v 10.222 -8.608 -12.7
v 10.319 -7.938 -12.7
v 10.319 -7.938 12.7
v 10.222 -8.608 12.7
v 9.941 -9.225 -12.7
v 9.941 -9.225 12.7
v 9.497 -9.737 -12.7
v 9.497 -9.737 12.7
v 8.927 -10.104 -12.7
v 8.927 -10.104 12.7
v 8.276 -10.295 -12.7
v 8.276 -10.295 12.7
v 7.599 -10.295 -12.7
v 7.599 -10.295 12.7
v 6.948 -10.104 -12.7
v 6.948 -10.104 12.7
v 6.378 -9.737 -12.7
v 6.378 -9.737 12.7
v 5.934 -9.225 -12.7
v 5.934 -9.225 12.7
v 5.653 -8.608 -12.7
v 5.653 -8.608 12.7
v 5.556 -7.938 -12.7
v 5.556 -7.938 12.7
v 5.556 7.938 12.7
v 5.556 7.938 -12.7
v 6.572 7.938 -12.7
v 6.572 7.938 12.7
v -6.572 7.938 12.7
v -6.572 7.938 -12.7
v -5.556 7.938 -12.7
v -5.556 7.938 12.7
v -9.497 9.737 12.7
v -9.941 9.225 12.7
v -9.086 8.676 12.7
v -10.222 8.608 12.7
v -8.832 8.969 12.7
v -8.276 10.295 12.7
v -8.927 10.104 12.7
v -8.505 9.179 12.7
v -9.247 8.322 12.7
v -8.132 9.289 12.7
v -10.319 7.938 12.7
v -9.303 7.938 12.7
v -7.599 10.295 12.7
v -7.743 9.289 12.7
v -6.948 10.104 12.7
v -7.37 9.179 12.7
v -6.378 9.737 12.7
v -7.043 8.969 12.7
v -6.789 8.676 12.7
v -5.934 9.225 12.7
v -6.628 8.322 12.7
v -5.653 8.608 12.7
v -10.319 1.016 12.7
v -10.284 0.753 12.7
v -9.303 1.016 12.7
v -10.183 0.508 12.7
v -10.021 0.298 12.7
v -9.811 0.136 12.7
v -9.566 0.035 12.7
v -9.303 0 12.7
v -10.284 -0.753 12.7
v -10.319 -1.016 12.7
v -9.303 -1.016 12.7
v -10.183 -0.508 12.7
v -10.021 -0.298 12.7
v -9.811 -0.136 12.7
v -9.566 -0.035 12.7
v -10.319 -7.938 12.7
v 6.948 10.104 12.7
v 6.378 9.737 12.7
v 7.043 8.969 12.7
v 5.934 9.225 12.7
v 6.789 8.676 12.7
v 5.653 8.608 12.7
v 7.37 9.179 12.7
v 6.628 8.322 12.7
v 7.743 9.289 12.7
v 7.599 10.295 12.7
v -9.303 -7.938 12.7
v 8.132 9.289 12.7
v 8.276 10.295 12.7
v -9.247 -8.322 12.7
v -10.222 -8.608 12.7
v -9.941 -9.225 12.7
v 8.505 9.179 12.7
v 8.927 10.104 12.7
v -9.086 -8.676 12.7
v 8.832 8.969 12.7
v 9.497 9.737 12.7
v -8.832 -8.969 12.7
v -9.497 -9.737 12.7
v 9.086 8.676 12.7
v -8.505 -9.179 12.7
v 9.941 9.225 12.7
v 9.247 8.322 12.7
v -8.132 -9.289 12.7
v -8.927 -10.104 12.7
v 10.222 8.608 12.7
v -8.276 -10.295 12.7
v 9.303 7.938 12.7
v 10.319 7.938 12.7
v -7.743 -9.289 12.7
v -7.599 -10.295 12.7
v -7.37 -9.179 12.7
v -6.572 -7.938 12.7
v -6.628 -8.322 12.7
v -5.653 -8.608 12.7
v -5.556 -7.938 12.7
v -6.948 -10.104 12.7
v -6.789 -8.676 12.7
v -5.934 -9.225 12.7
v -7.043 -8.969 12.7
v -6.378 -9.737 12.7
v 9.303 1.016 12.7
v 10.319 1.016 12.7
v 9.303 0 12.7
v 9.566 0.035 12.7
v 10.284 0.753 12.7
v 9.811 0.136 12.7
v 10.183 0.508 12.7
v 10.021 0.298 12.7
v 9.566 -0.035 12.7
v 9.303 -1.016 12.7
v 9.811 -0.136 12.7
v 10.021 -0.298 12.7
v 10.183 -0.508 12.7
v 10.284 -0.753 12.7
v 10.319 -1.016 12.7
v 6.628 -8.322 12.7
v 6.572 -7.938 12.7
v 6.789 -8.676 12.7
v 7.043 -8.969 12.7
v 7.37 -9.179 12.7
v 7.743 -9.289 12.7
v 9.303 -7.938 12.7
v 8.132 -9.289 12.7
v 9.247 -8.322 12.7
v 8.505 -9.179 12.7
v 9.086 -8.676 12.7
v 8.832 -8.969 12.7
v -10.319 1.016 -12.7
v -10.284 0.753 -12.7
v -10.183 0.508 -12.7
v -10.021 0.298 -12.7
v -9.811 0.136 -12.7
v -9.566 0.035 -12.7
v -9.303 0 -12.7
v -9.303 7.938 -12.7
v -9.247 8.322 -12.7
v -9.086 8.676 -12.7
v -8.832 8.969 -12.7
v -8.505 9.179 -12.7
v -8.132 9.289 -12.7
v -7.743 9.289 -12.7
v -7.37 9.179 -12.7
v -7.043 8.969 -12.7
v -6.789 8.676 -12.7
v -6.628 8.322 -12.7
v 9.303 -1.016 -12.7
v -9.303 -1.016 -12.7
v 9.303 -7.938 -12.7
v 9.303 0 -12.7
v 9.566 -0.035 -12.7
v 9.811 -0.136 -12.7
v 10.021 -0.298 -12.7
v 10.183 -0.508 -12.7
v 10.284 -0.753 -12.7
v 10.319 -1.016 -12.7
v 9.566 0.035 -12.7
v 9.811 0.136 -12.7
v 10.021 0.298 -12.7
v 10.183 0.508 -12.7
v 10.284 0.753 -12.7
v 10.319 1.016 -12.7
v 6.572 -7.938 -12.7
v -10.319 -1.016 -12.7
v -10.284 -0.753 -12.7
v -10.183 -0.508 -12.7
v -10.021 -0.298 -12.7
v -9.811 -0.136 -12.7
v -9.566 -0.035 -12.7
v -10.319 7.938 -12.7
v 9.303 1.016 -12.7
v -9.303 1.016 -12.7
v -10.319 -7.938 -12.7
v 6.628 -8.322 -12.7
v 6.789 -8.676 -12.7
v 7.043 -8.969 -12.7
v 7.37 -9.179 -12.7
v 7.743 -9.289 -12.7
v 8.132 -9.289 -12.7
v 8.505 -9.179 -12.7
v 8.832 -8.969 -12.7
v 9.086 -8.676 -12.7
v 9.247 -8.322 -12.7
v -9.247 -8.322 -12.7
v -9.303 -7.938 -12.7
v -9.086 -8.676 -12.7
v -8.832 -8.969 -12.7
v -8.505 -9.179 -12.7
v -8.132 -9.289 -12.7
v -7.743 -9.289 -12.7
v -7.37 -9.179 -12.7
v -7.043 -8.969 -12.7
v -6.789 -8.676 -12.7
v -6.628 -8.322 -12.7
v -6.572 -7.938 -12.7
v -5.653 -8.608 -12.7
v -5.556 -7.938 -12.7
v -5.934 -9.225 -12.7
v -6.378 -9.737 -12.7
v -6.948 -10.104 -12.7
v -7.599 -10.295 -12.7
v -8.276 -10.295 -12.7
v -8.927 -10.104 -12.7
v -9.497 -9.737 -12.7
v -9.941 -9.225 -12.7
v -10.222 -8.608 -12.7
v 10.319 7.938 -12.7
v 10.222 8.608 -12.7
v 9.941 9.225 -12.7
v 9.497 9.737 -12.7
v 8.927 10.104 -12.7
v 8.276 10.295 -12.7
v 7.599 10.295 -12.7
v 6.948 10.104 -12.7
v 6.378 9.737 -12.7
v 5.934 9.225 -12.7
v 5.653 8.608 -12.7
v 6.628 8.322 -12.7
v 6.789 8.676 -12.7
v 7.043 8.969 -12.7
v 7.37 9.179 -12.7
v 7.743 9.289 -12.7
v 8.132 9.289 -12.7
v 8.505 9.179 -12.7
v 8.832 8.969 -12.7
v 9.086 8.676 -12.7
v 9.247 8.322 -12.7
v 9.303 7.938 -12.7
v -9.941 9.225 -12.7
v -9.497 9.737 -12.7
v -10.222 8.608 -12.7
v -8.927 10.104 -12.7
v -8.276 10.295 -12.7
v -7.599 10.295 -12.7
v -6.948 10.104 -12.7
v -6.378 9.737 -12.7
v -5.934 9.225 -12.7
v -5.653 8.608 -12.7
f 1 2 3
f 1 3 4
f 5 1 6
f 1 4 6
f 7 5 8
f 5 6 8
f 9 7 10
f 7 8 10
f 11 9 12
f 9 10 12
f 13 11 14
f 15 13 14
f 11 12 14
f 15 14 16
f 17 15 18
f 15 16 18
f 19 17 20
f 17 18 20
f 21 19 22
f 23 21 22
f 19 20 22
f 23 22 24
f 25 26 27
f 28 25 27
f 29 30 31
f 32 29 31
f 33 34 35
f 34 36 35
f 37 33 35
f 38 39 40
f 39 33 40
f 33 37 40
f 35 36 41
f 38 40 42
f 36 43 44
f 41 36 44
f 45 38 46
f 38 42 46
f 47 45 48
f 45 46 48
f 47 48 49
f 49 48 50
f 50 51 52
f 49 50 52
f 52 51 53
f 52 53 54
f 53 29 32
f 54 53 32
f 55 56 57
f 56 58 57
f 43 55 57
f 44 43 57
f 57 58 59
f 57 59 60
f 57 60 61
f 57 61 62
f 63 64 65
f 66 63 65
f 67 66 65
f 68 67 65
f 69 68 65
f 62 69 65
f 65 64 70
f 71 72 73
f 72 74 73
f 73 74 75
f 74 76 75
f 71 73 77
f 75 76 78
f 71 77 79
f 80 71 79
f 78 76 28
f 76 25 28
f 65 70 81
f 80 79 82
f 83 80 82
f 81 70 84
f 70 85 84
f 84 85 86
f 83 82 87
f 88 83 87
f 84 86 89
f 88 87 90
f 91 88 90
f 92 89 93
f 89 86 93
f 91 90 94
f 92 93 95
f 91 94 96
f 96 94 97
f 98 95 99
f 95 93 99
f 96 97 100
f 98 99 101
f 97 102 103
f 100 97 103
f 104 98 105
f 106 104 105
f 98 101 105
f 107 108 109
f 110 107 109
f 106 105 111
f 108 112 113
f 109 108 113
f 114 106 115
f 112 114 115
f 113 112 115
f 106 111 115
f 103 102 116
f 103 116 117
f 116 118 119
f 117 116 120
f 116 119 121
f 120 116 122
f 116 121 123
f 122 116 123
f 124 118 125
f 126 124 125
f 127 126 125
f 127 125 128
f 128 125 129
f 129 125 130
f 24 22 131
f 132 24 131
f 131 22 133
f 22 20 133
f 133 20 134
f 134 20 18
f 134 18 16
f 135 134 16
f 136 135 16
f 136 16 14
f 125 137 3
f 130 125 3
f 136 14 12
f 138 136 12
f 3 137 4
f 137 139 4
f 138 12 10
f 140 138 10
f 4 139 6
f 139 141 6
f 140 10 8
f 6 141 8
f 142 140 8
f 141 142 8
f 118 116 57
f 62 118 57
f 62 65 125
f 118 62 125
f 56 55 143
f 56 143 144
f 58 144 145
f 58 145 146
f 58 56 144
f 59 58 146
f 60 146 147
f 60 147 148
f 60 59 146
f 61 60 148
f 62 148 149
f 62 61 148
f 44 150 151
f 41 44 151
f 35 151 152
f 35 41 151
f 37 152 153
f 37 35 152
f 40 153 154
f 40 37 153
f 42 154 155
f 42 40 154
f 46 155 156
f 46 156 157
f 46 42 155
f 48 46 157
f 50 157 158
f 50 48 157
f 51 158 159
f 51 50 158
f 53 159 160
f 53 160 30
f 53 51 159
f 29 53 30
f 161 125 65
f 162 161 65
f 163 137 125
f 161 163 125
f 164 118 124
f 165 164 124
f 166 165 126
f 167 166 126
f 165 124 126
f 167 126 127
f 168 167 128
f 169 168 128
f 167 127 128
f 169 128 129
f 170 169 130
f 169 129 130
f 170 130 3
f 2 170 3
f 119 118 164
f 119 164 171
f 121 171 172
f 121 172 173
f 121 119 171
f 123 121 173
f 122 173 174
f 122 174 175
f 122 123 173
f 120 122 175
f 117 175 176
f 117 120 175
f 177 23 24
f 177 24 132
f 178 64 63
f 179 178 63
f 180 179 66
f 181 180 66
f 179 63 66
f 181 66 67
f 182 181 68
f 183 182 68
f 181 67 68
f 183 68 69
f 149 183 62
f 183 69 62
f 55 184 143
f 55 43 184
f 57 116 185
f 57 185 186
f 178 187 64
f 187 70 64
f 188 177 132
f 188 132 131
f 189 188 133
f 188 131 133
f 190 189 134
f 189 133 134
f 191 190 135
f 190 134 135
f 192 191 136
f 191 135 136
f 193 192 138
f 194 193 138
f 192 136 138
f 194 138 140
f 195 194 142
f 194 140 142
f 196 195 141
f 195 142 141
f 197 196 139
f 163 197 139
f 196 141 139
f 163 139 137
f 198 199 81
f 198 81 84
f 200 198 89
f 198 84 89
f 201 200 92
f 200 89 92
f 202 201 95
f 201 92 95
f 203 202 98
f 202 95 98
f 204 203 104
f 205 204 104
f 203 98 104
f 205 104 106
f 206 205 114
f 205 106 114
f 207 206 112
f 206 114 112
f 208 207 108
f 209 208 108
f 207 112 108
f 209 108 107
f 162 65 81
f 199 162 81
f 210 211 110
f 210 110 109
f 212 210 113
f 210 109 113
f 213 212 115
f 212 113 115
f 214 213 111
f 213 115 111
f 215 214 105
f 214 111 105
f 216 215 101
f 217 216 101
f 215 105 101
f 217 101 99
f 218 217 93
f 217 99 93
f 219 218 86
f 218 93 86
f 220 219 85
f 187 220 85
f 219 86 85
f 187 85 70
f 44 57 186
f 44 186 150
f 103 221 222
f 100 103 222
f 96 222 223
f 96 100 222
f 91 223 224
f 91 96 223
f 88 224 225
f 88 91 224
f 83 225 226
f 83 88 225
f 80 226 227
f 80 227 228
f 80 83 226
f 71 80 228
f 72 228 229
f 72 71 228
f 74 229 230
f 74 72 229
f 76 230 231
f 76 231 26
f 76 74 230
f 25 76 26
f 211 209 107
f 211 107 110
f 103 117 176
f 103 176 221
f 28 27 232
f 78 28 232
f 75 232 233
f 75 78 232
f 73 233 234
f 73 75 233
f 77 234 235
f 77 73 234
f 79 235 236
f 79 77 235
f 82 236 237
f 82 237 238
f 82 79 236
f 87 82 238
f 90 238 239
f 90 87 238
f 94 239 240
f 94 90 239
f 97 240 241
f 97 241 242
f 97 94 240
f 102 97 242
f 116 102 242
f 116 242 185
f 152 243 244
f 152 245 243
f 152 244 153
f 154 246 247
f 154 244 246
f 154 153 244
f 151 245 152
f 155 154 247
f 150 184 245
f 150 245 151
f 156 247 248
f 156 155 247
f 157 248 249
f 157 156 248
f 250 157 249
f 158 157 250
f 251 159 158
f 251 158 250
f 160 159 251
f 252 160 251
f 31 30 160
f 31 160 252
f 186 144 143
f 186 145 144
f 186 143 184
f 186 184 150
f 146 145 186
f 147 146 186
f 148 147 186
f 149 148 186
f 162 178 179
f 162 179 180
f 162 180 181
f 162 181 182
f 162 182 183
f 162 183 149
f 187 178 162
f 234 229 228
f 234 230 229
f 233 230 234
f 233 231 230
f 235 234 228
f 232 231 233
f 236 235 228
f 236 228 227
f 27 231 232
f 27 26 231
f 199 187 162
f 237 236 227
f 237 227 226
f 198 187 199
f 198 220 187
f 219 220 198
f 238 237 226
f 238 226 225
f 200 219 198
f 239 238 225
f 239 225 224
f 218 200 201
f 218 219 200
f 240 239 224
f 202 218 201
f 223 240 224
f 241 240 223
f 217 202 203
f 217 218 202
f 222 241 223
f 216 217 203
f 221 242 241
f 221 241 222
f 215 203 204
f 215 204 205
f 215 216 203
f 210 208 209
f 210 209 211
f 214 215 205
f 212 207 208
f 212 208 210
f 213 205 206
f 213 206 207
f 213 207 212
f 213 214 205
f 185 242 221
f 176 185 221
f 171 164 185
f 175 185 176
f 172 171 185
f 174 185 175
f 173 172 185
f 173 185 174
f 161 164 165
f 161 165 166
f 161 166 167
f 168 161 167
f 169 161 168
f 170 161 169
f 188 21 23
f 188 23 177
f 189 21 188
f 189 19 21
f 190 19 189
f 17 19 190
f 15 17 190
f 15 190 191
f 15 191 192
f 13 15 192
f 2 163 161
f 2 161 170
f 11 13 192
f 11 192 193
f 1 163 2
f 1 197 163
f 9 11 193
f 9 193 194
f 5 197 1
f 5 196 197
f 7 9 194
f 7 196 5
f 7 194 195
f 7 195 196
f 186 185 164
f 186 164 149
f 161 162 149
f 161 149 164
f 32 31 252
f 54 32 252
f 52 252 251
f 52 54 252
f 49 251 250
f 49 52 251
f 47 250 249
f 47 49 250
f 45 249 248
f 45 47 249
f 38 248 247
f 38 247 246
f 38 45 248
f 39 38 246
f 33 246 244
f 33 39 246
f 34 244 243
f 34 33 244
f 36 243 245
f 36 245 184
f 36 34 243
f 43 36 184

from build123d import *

# Parameters (mm, degrees)
BASE_EXTRUDE_DEPTH = 12.7


with BuildPart() as part:
    # Sketch1 → Base-Extrude (new, symmetric)
    with BuildSketch(Plane.XY):
        with BuildLine():
            Line((-10.31875, 7.9375), (-10.31875, 1.016))
            ThreePointArc((-10.31875, 1.016), (-10.02117049, 0.29757951), (-9.30275, 0))
            Line((-9.30275, 0), (9.30275, 0))
            ThreePointArc((9.30275, 0), (10.02117049, 0.29757951), (10.31875, 1.016))
            Line((10.31875, 1.016), (10.31875, 7.9375))
            ThreePointArc((10.31875, 7.9375), (7.9375, 10.31875), (5.55625, 7.9375))
            Line((5.55625, 7.9375), (6.57225, 7.9375))
            ThreePointArc((6.57225, 7.9375), (7.9375, 9.30275), (9.30275, 7.9375))
            Line((9.30275, 7.9375), (9.30275, 1.016))
            Line((9.30275, 1.016), (-9.30275, 1.016))
            Line((-9.30275, 1.016), (-9.30275, 7.9375))
            ThreePointArc((-9.30275, 7.9375), (-7.9375, 9.30275), (-6.57225, 7.9375))
            Line((-6.57225, 7.9375), (-5.55625, 7.9375))
            ThreePointArc((-5.55625, 7.9375), (-7.9375, 10.31875), (-10.31875, 7.9375))
        make_face()
    base_extrude = extrude(amount=BASE_EXTRUDE_DEPTH, both=True)

    # Mirror1: Base-Extrude across plane
    add(base_extrude.mirror(Plane.ZX))


solid = part.part
